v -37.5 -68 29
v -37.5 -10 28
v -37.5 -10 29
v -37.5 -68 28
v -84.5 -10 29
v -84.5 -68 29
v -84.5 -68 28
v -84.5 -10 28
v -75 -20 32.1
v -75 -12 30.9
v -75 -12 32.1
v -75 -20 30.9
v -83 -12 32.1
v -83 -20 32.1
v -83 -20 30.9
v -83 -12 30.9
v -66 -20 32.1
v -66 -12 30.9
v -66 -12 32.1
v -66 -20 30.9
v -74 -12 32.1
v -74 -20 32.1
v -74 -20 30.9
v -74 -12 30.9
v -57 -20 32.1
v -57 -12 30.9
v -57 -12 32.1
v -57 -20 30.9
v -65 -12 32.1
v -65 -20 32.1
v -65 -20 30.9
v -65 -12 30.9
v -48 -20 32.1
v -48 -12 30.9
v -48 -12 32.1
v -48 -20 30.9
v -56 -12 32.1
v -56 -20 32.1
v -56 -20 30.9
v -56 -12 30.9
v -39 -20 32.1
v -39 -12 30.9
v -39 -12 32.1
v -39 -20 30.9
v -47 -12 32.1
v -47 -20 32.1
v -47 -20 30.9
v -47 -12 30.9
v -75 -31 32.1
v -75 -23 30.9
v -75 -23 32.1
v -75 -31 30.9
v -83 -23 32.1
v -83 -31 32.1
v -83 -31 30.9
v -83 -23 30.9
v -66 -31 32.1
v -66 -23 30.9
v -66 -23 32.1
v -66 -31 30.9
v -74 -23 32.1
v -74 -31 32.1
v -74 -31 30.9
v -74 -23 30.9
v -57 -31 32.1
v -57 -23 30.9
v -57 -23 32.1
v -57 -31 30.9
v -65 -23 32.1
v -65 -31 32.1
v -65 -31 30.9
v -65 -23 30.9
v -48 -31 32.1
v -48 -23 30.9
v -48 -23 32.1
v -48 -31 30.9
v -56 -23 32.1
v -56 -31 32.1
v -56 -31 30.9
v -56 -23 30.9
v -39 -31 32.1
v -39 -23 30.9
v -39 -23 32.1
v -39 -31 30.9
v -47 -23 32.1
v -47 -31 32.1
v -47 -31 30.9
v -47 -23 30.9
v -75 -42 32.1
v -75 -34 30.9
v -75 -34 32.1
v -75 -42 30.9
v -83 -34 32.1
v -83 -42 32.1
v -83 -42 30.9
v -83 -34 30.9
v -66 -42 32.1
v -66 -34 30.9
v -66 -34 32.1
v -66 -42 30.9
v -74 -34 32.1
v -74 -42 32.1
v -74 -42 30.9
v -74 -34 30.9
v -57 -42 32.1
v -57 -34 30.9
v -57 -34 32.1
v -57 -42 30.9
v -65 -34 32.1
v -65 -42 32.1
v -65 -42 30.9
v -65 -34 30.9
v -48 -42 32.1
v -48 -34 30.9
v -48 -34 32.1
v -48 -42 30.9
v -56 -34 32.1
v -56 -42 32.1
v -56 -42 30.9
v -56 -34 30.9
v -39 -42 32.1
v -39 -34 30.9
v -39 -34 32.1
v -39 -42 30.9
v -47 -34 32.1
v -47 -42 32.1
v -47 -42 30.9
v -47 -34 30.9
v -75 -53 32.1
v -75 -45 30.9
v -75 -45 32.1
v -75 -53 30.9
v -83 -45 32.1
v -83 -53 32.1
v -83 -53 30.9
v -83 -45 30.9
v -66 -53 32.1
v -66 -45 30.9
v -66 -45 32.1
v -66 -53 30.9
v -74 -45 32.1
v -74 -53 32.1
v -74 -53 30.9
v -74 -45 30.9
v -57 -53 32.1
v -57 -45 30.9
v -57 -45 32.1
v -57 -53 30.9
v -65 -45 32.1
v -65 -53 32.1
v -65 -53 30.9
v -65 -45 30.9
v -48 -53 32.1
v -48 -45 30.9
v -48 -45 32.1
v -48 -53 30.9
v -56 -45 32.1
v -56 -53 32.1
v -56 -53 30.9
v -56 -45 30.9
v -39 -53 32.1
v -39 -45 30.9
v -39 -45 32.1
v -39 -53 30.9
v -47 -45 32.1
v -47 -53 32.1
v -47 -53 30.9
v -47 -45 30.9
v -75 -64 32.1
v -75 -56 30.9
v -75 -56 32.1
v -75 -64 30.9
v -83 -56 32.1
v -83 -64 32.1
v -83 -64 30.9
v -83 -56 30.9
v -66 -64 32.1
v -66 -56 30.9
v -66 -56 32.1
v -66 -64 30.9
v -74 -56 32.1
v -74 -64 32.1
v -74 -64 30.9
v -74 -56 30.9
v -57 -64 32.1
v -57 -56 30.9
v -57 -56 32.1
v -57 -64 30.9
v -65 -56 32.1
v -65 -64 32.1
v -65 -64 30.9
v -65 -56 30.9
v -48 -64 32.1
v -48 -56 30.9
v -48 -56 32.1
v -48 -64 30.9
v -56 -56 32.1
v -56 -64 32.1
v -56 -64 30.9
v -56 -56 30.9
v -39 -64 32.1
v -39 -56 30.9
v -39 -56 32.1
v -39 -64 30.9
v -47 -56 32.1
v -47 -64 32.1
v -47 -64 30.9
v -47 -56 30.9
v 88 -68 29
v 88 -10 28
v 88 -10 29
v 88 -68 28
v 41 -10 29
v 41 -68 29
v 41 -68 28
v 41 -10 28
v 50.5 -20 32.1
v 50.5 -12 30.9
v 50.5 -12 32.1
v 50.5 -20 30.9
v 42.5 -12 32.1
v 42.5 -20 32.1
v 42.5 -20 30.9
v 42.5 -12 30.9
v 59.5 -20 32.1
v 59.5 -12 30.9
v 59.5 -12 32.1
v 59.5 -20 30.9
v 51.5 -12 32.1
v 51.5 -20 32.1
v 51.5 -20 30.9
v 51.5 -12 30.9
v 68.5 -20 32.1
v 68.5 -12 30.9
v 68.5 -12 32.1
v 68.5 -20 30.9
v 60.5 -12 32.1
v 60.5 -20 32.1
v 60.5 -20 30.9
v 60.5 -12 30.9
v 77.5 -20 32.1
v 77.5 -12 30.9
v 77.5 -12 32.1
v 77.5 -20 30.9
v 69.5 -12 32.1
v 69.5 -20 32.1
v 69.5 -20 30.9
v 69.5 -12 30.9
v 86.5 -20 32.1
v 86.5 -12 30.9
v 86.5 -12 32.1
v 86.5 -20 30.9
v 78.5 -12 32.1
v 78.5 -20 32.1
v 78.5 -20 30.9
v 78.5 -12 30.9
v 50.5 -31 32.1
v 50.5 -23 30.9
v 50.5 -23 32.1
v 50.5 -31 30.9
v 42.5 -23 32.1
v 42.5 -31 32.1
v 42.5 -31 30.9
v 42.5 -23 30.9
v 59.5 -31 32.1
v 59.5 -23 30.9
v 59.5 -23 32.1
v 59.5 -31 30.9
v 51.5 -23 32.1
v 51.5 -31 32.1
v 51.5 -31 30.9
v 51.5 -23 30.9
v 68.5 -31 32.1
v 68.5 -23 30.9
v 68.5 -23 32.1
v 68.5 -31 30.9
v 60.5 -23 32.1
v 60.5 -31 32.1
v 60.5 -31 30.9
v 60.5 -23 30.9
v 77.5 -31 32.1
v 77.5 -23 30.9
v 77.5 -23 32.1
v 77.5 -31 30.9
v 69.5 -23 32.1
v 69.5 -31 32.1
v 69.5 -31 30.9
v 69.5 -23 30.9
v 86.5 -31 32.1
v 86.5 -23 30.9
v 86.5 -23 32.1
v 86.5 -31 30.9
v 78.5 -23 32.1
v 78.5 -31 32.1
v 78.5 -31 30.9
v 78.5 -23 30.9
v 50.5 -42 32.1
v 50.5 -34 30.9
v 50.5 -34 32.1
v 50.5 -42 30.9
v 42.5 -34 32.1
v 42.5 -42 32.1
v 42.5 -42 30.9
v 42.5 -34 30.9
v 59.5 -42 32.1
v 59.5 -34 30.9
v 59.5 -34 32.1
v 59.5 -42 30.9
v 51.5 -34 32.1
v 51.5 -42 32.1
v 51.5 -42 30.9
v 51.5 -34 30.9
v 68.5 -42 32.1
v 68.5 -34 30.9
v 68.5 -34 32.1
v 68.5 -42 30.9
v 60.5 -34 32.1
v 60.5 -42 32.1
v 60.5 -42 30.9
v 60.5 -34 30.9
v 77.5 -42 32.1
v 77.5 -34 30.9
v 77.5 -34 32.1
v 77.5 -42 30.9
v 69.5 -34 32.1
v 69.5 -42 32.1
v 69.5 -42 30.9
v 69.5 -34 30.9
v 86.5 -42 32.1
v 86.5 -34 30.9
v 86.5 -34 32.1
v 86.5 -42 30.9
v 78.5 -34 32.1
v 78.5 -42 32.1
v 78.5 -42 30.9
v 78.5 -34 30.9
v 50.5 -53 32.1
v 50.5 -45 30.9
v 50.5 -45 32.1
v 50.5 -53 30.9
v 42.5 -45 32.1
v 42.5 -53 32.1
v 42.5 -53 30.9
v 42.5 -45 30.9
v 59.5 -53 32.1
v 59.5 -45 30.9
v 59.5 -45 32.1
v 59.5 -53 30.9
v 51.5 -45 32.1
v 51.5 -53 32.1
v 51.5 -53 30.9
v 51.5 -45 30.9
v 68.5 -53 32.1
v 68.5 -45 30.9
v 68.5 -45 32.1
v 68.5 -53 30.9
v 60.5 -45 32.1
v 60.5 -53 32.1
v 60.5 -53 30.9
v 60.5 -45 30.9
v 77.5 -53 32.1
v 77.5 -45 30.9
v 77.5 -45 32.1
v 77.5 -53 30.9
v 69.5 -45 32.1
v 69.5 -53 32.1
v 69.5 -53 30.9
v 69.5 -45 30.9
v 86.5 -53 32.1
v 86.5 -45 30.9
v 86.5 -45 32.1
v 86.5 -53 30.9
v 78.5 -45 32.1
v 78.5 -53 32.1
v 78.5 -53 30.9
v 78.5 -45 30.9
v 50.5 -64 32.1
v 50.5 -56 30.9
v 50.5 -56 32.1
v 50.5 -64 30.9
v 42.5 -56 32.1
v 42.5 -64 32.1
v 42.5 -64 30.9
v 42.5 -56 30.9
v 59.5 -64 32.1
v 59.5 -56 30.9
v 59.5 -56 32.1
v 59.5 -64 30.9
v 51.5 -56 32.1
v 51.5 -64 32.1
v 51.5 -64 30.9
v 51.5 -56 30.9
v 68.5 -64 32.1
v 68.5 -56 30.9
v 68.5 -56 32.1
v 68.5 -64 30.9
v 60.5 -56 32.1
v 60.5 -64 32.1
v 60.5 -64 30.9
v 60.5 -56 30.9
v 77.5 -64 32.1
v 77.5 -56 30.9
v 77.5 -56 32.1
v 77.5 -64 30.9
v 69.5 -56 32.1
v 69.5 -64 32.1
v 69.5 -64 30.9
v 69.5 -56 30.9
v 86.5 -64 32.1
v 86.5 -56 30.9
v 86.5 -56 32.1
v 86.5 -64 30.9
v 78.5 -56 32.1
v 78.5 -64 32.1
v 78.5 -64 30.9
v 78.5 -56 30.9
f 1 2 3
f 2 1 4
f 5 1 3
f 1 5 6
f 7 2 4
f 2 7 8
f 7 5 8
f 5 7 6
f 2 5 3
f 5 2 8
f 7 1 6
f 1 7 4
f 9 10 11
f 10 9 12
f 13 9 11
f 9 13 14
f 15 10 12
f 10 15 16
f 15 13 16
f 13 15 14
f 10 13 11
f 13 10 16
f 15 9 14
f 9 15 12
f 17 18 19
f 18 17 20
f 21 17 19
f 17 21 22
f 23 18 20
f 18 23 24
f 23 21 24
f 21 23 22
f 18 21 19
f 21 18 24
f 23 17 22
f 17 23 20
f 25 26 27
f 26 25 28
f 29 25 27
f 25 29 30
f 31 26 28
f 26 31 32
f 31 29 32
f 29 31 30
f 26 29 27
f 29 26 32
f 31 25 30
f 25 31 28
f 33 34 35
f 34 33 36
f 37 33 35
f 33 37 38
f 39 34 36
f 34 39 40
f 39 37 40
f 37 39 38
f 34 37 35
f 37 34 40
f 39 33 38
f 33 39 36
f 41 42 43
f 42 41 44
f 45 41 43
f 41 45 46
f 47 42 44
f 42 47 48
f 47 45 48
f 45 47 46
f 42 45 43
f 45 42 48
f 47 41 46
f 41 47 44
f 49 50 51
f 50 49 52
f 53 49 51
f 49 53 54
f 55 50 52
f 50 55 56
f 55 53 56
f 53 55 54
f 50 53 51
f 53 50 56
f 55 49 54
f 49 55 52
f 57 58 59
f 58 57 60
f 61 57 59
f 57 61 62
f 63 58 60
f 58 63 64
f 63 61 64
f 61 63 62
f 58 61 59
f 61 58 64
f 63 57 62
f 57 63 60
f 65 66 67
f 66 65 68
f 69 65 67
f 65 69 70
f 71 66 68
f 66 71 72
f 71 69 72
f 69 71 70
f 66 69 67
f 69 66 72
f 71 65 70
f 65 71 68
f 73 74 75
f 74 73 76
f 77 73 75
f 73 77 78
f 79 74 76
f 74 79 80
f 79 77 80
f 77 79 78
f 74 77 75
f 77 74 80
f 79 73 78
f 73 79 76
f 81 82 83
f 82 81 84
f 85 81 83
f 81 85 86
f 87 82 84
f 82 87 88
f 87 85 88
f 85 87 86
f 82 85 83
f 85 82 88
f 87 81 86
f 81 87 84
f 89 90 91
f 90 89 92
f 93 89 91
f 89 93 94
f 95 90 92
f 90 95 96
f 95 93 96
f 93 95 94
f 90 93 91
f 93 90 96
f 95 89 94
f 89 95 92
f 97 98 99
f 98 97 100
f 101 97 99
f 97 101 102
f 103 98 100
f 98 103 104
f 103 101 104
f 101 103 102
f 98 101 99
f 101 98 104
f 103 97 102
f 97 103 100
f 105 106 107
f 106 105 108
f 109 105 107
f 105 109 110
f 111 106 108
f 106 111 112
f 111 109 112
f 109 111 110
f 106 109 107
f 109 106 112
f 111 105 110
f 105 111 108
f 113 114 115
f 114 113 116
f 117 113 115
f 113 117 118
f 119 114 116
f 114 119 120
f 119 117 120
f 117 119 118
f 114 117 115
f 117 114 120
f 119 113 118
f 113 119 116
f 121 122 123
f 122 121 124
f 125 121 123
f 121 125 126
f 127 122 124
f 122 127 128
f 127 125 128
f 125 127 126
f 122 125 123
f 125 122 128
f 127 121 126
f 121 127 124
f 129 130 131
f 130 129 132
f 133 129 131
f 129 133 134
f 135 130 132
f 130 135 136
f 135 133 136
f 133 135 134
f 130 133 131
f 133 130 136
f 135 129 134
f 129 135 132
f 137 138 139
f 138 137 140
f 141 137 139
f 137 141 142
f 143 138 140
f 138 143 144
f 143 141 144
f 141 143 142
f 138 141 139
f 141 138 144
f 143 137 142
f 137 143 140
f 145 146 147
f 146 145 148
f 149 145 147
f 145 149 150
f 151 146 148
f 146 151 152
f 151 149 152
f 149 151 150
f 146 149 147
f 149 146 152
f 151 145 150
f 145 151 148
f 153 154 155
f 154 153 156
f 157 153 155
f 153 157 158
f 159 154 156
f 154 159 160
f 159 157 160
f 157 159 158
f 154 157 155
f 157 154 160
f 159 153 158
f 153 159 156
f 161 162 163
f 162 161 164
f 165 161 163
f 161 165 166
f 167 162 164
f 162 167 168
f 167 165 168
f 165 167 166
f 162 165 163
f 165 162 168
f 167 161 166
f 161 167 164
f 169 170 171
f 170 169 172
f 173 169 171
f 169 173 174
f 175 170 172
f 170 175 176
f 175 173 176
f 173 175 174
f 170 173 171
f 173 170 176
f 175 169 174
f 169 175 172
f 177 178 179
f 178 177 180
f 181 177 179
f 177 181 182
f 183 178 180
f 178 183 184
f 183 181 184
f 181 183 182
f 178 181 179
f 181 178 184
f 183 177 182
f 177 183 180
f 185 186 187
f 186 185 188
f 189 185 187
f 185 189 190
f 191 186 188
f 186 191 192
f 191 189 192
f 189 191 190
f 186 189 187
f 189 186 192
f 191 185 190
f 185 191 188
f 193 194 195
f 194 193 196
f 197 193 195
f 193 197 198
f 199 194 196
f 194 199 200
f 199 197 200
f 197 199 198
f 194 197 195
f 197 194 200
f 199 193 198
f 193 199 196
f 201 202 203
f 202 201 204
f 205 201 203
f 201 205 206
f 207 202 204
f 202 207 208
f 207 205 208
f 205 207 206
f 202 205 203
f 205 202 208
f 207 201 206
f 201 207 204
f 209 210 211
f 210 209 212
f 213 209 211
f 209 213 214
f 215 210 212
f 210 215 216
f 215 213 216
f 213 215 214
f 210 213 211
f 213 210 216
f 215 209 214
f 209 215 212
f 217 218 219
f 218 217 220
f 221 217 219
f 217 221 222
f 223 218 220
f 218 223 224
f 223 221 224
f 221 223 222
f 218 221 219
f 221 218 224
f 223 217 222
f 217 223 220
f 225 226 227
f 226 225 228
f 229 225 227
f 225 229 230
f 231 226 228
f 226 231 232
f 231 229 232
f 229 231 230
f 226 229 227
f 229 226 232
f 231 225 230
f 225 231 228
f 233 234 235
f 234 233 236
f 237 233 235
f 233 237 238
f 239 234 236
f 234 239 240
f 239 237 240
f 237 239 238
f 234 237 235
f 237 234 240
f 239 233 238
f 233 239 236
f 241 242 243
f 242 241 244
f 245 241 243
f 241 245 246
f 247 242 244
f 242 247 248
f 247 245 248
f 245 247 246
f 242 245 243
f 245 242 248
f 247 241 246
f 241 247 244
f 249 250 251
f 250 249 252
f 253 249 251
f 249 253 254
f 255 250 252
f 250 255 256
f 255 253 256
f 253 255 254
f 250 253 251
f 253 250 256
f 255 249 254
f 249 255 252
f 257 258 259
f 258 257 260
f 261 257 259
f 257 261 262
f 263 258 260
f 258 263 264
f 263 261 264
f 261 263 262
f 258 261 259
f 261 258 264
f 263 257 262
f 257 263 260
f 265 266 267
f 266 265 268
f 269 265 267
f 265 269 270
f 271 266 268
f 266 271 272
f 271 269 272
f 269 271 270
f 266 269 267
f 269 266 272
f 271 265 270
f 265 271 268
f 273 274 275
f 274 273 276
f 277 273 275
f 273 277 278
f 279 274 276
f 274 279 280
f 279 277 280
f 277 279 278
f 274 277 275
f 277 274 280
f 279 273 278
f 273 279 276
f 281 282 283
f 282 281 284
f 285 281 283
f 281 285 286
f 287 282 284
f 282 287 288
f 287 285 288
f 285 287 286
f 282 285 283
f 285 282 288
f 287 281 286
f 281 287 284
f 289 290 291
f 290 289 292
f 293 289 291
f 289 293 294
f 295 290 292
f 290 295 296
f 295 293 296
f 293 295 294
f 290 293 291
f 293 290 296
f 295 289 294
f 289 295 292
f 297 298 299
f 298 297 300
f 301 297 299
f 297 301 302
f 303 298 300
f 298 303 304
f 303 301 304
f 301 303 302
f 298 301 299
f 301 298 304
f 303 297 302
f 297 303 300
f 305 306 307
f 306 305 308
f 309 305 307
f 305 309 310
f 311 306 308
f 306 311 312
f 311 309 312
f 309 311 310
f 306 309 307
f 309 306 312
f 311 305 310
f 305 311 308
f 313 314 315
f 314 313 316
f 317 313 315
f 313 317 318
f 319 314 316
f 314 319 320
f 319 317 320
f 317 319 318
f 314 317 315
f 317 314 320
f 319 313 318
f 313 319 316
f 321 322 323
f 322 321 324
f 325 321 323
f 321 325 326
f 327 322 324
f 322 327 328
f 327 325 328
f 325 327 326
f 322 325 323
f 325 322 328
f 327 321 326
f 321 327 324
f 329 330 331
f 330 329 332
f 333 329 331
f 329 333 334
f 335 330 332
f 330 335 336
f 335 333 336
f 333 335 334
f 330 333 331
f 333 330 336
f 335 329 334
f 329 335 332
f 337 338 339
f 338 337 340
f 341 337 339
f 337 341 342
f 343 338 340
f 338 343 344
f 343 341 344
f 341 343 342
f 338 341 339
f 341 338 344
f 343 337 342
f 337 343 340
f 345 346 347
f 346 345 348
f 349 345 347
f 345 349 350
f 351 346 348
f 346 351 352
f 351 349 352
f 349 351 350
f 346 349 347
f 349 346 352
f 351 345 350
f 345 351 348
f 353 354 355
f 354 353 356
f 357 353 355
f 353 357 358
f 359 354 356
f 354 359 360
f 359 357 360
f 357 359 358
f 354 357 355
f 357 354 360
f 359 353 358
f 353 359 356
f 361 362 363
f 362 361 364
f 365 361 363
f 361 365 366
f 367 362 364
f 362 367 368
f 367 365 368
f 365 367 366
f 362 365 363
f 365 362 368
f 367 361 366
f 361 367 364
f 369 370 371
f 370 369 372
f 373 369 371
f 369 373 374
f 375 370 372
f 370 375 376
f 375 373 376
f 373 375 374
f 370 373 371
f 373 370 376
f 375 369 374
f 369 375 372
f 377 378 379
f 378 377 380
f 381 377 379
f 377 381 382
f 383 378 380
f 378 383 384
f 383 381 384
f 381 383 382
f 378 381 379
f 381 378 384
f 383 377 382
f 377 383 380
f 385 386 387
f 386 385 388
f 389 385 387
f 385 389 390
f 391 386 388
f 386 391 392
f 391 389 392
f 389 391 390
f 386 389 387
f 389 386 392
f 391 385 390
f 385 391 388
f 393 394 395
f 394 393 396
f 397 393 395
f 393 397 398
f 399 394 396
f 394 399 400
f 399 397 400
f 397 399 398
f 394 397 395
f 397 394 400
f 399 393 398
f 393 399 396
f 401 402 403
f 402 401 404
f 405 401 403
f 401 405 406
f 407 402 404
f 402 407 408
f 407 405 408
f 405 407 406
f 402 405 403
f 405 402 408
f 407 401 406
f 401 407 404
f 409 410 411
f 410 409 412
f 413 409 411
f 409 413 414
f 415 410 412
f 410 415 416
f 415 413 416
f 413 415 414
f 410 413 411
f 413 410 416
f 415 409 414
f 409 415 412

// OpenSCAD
// Thor QWERTY retrofit conceptual solids, mm
// Source scan and exact inner housing *not* redistributed or certified.
// Two attachments are displayed OVER original control areas.
// This is not a cutting template or closed-lid clearance proof.
include_scan = false;
source_scan = "/tmp/hs-thor-open-reference-20261109.stl";
if (include_scan) color([0.55,0.55,0.58,0.4]) import(source_scan, convexity=3);
pcb_thickness = 1.0;  // exploratory, not KiCad stackup qualified
switch_height = 1.9; // C&K KMR2 spec over PCB
cap_extra_height = 1.2; // unverified cap geometry
module_z = 28.0; // placeholder: NOT qualified from internal scan
module_mounts_known = false;
module_lid_clearance_known = false;
// left: original controls should be removed, but mounts unproven
color([0.12,0.36,0.48,0.76]) translate([-84.5,-68.0,module_z]) cube([47.0,58.0,pcb_thickness]);
color([0.81,0.92,0.78]) translate([-83.000,-20.000,module_z+pcb_thickness+switch_height]) cube([8.0,8.0,cap_extra_height]); // Q
color([0.81,0.92,0.78]) translate([-74.000,-20.000,module_z+pcb_thickness+switch_height]) cube([8.0,8.0,cap_extra_height]); // W
color([0.81,0.92,0.78]) translate([-65.000,-20.000,module_z+pcb_thickness+switch_height]) cube([8.0,8.0,cap_extra_height]); // E
color([0.81,0.92,0.78]) translate([-56.000,-20.000,module_z+pcb_thickness+switch_height]) cube([8.0,8.0,cap_extra_height]); // R
color([0.81,0.92,0.78]) translate([-47.000,-20.000,module_z+pcb_thickness+switch_height]) cube([8.0,8.0,cap_extra_height]); // T
color([0.81,0.92,0.78]) translate([-83.000,-31.000,module_z+pcb_thickness+switch_height]) cube([8.0,8.0,cap_extra_height]); // A
color([0.81,0.92,0.78]) translate([-74.000,-31.000,module_z+pcb_thickness+switch_height]) cube([8.0,8.0,cap_extra_height]); // S
color([0.81,0.92,0.78]) translate([-65.000,-31.000,module_z+pcb_thickness+switch_height]) cube([8.0,8.0,cap_extra_height]); // D
color([0.81,0.92,0.78]) translate([-56.000,-31.000,module_z+pcb_thickness+switch_height]) cube([8.0,8.0,cap_extra_height]); // F
color([0.81,0.92,0.78]) translate([-47.000,-31.000,module_z+pcb_thickness+switch_height]) cube([8.0,8.0,cap_extra_height]); // G
color([0.81,0.92,0.78]) translate([-83.000,-42.000,module_z+pcb_thickness+switch_height]) cube([8.0,8.0,cap_extra_height]); // Z
color([0.81,0.92,0.78]) translate([-74.000,-42.000,module_z+pcb_thickness+switch_height]) cube([8.0,8.0,cap_extra_height]); // X
color([0.81,0.92,0.78]) translate([-65.000,-42.000,module_z+pcb_thickness+switch_height]) cube([8.0,8.0,cap_extra_height]); // C
color([0.81,0.92,0.78]) translate([-56.000,-42.000,module_z+pcb_thickness+switch_height]) cube([8.0,8.0,cap_extra_height]); // V
color([0.81,0.92,0.78]) translate([-47.000,-42.000,module_z+pcb_thickness+switch_height]) cube([8.0,8.0,cap_extra_height]); // B
color([0.81,0.92,0.78]) translate([-83.000,-53.000,module_z+pcb_thickness+switch_height]) cube([8.0,8.0,cap_extra_height]); // 1
color([0.81,0.92,0.78]) translate([-74.000,-53.000,module_z+pcb_thickness+switch_height]) cube([8.0,8.0,cap_extra_height]); // 2
color([0.81,0.92,0.78]) translate([-65.000,-53.000,module_z+pcb_thickness+switch_height]) cube([8.0,8.0,cap_extra_height]); // 3
color([0.81,0.92,0.78]) translate([-56.000,-53.000,module_z+pcb_thickness+switch_height]) cube([8.0,8.0,cap_extra_height]); // 4
color([0.81,0.92,0.78]) translate([-47.000,-53.000,module_z+pcb_thickness+switch_height]) cube([8.0,8.0,cap_extra_height]); // 5
color([0.81,0.92,0.78]) translate([-83.000,-64.000,module_z+pcb_thickness+switch_height]) cube([8.0,8.0,cap_extra_height]); // SHIFT
color([0.81,0.92,0.78]) translate([-74.000,-64.000,module_z+pcb_thickness+switch_height]) cube([8.0,8.0,cap_extra_height]); // CTRL
color([0.81,0.92,0.78]) translate([-65.000,-64.000,module_z+pcb_thickness+switch_height]) cube([8.0,8.0,cap_extra_height]); // ALT
color([0.81,0.92,0.78]) translate([-56.000,-64.000,module_z+pcb_thickness+switch_height]) cube([8.0,8.0,cap_extra_height]); // TAB
color([0.81,0.92,0.78]) translate([-47.000,-64.000,module_z+pcb_thickness+switch_height]) cube([8.0,8.0,cap_extra_height]); // FN
// right: original controls should be removed, but mounts unproven
color([0.12,0.36,0.48,0.76]) translate([41.0,-68.0,module_z]) cube([47.0,58.0,pcb_thickness]);
color([0.81,0.92,0.78]) translate([42.500,-20.000,module_z+pcb_thickness+switch_height]) cube([8.0,8.0,cap_extra_height]); // Y
color([0.81,0.92,0.78]) translate([51.500,-20.000,module_z+pcb_thickness+switch_height]) cube([8.0,8.0,cap_extra_height]); // U
color([0.81,0.92,0.78]) translate([60.500,-20.000,module_z+pcb_thickness+switch_height]) cube([8.0,8.0,cap_extra_height]); // I
color([0.81,0.92,0.78]) translate([69.500,-20.000,module_z+pcb_thickness+switch_height]) cube([8.0,8.0,cap_extra_height]); // O
color([0.81,0.92,0.78]) translate([78.500,-20.000,module_z+pcb_thickness+switch_height]) cube([8.0,8.0,cap_extra_height]); // P
color([0.81,0.92,0.78]) translate([42.500,-31.000,module_z+pcb_thickness+switch_height]) cube([8.0,8.0,cap_extra_height]); // H
color([0.81,0.92,0.78]) translate([51.500,-31.000,module_z+pcb_thickness+switch_height]) cube([8.0,8.0,cap_extra_height]); // J
color([0.81,0.92,0.78]) translate([60.500,-31.000,module_z+pcb_thickness+switch_height]) cube([8.0,8.0,cap_extra_height]); // K
color([0.81,0.92,0.78]) translate([69.500,-31.000,module_z+pcb_thickness+switch_height]) cube([8.0,8.0,cap_extra_height]); // L
color([0.81,0.92,0.78]) translate([78.500,-31.000,module_z+pcb_thickness+switch_height]) cube([8.0,8.0,cap_extra_height]); // ;
color([0.81,0.92,0.78]) translate([42.500,-42.000,module_z+pcb_thickness+switch_height]) cube([8.0,8.0,cap_extra_height]); // N
color([0.81,0.92,0.78]) translate([51.500,-42.000,module_z+pcb_thickness+switch_height]) cube([8.0,8.0,cap_extra_height]); // M
color([0.81,0.92,0.78]) translate([60.500,-42.000,module_z+pcb_thickness+switch_height]) cube([8.0,8.0,cap_extra_height]); // ,
color([0.81,0.92,0.78]) translate([69.500,-42.000,module_z+pcb_thickness+switch_height]) cube([8.0,8.0,cap_extra_height]); // .
color([0.81,0.92,0.78]) translate([78.500,-42.000,module_z+pcb_thickness+switch_height]) cube([8.0,8.0,cap_extra_height]); // /
color([0.81,0.92,0.78]) translate([42.500,-53.000,module_z+pcb_thickness+switch_height]) cube([8.0,8.0,cap_extra_height]); // 6
color([0.81,0.92,0.78]) translate([51.500,-53.000,module_z+pcb_thickness+switch_height]) cube([8.0,8.0,cap_extra_height]); // 7
color([0.81,0.92,0.78]) translate([60.500,-53.000,module_z+pcb_thickness+switch_height]) cube([8.0,8.0,cap_extra_height]); // 8
color([0.81,0.92,0.78]) translate([69.500,-53.000,module_z+pcb_thickness+switch_height]) cube([8.0,8.0,cap_extra_height]); // 9
color([0.81,0.92,0.78]) translate([78.500,-53.000,module_z+pcb_thickness+switch_height]) cube([8.0,8.0,cap_extra_height]); // 0
color([0.81,0.92,0.78]) translate([42.500,-64.000,module_z+pcb_thickness+switch_height]) cube([8.0,8.0,cap_extra_height]); // SYM
color([0.81,0.92,0.78]) translate([51.500,-64.000,module_z+pcb_thickness+switch_height]) cube([8.0,8.0,cap_extra_height]); // SPACE
color([0.81,0.92,0.78]) translate([60.500,-64.000,module_z+pcb_thickness+switch_height]) cube([8.0,8.0,cap_extra_height]); // ENTER
color([0.81,0.92,0.78]) translate([69.500,-64.000,module_z+pcb_thickness+switch_height]) cube([8.0,8.0,cap_extra_height]); // BSPC
color([0.81,0.92,0.78]) translate([78.500,-64.000,module_z+pcb_thickness+switch_height]) cube([8.0,8.0,cap_extra_height]); // ESC
